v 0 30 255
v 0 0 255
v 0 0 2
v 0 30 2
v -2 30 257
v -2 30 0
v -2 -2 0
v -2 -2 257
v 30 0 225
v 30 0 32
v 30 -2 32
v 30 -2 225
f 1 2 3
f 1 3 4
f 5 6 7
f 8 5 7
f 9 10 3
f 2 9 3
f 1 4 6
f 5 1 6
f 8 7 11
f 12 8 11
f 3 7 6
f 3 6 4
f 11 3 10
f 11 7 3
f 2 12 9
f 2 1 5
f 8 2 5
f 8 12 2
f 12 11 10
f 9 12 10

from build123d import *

# Parameters (mm, degrees)
EXTRUDE_THIN6_DEPTH = 257
CUT_EXTRUDE1_DEPTH  = 261.716320931


with BuildPart() as part:
    # Sketch2 → Extrude-Thin6 (new body)
    with BuildSketch(Plane.XY):
        Polygon((30, 0), (0, 0), (0, 30), (-2, 30), (-2, -2), (30, -2), align=None)
    extrude(amount=EXTRUDE_THIN6_DEPTH)

    # Sketch3 → Cut-Extrude1 (cut, through all)
    with BuildSketch(Plane(origin=(0, -2, 0), x_dir=(1, 0, 0), z_dir=(0, 1, 0))):
        Polygon((-2, 0), (30, -32), (30, 0), align=None)
        Polygon((30, -257), (30, -225), (-2, -257), align=None)
    extrude(amount=CUT_EXTRUDE1_DEPTH, mode=Mode.SUBTRACT)


solid = part.part
